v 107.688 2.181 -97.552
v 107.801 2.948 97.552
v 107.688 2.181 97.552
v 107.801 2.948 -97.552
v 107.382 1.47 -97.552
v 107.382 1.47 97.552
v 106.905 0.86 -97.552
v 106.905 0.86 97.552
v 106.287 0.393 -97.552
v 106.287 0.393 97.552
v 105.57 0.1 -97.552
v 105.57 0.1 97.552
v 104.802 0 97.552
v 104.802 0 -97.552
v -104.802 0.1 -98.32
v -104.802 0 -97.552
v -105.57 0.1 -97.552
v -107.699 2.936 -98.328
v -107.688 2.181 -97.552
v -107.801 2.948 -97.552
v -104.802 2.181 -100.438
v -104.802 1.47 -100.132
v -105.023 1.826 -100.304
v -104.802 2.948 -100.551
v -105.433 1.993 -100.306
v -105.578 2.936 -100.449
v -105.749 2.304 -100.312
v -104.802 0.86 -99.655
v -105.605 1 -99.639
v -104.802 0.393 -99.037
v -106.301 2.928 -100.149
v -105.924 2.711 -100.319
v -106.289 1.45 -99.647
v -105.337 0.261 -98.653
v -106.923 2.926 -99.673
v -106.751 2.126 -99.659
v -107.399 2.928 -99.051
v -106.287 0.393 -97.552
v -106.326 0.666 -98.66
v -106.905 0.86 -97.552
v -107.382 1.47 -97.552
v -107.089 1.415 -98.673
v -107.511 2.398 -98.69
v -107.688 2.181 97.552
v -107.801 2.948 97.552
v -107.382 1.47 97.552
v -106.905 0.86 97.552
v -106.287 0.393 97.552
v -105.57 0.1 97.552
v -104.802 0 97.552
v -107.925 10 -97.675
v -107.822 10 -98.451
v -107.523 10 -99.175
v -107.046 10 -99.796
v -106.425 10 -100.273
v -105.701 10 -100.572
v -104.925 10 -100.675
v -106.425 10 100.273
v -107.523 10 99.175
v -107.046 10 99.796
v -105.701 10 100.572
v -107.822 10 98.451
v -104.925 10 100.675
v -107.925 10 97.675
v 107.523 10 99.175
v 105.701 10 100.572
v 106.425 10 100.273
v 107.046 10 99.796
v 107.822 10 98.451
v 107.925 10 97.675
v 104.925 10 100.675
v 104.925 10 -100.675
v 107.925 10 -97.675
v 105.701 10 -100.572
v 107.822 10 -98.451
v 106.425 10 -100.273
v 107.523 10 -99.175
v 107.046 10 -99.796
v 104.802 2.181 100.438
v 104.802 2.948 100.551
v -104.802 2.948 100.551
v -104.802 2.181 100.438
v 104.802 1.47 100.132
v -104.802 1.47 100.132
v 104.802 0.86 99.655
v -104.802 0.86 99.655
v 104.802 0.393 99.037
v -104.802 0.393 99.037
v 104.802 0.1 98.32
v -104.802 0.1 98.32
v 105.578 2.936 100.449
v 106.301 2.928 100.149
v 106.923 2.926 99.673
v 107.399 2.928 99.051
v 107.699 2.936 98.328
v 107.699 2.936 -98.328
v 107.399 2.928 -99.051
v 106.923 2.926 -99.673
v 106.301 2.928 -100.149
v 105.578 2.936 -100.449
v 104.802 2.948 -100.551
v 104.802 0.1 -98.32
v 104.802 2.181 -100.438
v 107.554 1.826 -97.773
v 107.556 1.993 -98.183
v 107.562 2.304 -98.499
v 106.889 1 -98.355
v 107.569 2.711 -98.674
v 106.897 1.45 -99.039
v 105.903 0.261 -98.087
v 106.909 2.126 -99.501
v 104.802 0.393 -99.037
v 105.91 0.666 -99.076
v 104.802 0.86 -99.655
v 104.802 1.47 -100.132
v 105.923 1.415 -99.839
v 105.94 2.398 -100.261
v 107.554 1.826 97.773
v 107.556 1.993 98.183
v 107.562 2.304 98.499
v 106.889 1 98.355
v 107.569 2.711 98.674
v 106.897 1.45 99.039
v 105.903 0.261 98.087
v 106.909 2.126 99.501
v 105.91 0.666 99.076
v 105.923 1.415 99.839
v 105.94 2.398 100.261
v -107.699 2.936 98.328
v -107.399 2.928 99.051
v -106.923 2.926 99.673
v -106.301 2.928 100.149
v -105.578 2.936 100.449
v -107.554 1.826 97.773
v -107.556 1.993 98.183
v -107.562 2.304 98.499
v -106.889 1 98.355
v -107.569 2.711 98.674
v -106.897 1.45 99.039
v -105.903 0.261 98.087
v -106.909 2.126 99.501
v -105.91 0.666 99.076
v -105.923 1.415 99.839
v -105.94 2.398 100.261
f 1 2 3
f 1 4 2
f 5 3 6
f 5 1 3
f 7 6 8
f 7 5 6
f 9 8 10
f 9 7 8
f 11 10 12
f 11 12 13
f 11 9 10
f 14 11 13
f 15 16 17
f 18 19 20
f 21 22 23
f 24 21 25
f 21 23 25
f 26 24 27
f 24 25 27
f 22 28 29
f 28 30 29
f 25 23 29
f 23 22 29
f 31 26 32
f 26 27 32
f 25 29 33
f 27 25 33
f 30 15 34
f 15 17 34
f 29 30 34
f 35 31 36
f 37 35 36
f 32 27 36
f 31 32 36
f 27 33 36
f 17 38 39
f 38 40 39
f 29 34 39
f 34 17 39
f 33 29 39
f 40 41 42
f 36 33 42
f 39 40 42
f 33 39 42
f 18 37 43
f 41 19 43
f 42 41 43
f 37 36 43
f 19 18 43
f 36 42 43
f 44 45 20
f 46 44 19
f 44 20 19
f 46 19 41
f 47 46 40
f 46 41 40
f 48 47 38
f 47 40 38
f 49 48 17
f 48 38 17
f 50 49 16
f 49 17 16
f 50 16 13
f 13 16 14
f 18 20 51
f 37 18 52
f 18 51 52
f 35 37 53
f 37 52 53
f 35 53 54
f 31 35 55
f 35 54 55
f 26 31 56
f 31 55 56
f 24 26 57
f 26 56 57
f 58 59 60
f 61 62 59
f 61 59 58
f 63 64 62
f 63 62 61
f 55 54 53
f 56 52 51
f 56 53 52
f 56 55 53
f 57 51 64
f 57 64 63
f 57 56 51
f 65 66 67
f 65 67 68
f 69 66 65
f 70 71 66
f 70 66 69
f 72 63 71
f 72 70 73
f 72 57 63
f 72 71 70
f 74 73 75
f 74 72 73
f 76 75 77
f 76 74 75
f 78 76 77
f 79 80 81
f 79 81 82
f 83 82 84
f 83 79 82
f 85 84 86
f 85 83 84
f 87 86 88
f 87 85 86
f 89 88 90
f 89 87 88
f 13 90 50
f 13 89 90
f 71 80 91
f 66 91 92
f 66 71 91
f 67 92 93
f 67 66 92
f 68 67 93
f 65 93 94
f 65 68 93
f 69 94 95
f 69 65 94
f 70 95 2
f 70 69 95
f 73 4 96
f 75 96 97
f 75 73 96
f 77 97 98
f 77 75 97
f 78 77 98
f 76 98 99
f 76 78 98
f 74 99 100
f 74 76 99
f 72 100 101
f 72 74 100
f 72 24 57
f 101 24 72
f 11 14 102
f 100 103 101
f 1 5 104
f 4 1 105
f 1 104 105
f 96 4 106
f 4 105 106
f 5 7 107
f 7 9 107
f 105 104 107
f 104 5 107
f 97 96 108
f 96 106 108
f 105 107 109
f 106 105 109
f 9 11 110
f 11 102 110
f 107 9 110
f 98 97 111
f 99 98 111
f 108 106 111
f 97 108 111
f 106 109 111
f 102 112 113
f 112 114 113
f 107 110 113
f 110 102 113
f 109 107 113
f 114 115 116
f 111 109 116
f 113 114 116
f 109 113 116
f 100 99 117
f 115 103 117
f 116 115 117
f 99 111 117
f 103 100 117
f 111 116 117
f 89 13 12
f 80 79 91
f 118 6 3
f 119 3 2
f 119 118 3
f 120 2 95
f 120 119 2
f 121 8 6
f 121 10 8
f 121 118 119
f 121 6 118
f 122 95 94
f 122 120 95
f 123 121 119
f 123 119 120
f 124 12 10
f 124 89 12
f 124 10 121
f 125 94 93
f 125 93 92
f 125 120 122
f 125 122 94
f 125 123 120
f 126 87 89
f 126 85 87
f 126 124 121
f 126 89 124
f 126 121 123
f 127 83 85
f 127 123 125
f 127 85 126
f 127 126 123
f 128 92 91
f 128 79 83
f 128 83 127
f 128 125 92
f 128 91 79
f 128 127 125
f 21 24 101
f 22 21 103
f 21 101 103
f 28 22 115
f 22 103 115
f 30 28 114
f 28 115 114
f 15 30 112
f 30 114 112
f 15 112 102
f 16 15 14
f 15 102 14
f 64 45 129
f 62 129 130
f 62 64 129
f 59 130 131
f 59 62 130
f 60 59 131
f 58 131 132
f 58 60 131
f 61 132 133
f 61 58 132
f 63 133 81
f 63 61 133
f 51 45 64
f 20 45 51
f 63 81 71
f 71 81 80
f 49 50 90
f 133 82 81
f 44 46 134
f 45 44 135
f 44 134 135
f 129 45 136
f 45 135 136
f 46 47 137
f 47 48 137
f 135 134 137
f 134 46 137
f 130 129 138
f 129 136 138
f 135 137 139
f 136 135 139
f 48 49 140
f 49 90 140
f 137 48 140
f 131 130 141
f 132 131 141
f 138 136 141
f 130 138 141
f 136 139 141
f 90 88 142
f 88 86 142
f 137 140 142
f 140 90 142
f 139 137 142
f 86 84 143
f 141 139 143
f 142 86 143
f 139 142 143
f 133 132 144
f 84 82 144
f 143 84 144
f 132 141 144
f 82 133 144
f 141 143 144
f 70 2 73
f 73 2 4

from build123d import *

# Parameters (mm, degrees)
SKETCH1_W           = 215.5
SKETCH1_H           = 201
BOSS_EXTRUDE1_DEPTH = 10
BOSS_EXTRUDE1_DRAFT = -1
FILLET1_R           = 3


with BuildPart() as part:
    # Sketch1 → Boss-Extrude1 (with draft: the straight prism first)
    with BuildSketch(Plane(origin=(0, 0, 0), x_dir=(1, 0, 0), z_dir=(0, 1, 0))):
        Rectangle(SKETCH1_W, SKETCH1_H)
    extrude(amount=BOSS_EXTRUDE1_DEPTH)
    # Boss-Extrude1: the draft: its side faces are tilted about the plane it starts from
    boss_extrude1_sides = [part.faces().sort_by_distance(p)[0] for p in [
        (0, 5, 100.5),
        (107.75, 5, 0),
        (0, 5, -100.5),
        (-107.75, 5, 0),
    ]]
    draft(boss_extrude1_sides, Plane(origin=(0, 0, 0), x_dir=(1, 0, 0), z_dir=(0, 1, 0)), BOSS_EXTRUDE1_DRAFT)

    # Fillet1
    fillet1_edges = [part.edges().sort_by_distance(p)[0] for p in [
        (0, 0, 100.5),
        (-107.75, 0, 0),
        (0, 0, -100.5),
        (107.75, 0, 0),
        (107.837275325, 5, 100.587275325),
        (-107.837275325, 5, 100.587275325),
        (-107.837275325, 5, -100.587275325),
        (107.837275325, 5, -100.587275325),
    ]]
    fillet(fillet1_edges, radius=FILLET1_R)


solid = part.part
